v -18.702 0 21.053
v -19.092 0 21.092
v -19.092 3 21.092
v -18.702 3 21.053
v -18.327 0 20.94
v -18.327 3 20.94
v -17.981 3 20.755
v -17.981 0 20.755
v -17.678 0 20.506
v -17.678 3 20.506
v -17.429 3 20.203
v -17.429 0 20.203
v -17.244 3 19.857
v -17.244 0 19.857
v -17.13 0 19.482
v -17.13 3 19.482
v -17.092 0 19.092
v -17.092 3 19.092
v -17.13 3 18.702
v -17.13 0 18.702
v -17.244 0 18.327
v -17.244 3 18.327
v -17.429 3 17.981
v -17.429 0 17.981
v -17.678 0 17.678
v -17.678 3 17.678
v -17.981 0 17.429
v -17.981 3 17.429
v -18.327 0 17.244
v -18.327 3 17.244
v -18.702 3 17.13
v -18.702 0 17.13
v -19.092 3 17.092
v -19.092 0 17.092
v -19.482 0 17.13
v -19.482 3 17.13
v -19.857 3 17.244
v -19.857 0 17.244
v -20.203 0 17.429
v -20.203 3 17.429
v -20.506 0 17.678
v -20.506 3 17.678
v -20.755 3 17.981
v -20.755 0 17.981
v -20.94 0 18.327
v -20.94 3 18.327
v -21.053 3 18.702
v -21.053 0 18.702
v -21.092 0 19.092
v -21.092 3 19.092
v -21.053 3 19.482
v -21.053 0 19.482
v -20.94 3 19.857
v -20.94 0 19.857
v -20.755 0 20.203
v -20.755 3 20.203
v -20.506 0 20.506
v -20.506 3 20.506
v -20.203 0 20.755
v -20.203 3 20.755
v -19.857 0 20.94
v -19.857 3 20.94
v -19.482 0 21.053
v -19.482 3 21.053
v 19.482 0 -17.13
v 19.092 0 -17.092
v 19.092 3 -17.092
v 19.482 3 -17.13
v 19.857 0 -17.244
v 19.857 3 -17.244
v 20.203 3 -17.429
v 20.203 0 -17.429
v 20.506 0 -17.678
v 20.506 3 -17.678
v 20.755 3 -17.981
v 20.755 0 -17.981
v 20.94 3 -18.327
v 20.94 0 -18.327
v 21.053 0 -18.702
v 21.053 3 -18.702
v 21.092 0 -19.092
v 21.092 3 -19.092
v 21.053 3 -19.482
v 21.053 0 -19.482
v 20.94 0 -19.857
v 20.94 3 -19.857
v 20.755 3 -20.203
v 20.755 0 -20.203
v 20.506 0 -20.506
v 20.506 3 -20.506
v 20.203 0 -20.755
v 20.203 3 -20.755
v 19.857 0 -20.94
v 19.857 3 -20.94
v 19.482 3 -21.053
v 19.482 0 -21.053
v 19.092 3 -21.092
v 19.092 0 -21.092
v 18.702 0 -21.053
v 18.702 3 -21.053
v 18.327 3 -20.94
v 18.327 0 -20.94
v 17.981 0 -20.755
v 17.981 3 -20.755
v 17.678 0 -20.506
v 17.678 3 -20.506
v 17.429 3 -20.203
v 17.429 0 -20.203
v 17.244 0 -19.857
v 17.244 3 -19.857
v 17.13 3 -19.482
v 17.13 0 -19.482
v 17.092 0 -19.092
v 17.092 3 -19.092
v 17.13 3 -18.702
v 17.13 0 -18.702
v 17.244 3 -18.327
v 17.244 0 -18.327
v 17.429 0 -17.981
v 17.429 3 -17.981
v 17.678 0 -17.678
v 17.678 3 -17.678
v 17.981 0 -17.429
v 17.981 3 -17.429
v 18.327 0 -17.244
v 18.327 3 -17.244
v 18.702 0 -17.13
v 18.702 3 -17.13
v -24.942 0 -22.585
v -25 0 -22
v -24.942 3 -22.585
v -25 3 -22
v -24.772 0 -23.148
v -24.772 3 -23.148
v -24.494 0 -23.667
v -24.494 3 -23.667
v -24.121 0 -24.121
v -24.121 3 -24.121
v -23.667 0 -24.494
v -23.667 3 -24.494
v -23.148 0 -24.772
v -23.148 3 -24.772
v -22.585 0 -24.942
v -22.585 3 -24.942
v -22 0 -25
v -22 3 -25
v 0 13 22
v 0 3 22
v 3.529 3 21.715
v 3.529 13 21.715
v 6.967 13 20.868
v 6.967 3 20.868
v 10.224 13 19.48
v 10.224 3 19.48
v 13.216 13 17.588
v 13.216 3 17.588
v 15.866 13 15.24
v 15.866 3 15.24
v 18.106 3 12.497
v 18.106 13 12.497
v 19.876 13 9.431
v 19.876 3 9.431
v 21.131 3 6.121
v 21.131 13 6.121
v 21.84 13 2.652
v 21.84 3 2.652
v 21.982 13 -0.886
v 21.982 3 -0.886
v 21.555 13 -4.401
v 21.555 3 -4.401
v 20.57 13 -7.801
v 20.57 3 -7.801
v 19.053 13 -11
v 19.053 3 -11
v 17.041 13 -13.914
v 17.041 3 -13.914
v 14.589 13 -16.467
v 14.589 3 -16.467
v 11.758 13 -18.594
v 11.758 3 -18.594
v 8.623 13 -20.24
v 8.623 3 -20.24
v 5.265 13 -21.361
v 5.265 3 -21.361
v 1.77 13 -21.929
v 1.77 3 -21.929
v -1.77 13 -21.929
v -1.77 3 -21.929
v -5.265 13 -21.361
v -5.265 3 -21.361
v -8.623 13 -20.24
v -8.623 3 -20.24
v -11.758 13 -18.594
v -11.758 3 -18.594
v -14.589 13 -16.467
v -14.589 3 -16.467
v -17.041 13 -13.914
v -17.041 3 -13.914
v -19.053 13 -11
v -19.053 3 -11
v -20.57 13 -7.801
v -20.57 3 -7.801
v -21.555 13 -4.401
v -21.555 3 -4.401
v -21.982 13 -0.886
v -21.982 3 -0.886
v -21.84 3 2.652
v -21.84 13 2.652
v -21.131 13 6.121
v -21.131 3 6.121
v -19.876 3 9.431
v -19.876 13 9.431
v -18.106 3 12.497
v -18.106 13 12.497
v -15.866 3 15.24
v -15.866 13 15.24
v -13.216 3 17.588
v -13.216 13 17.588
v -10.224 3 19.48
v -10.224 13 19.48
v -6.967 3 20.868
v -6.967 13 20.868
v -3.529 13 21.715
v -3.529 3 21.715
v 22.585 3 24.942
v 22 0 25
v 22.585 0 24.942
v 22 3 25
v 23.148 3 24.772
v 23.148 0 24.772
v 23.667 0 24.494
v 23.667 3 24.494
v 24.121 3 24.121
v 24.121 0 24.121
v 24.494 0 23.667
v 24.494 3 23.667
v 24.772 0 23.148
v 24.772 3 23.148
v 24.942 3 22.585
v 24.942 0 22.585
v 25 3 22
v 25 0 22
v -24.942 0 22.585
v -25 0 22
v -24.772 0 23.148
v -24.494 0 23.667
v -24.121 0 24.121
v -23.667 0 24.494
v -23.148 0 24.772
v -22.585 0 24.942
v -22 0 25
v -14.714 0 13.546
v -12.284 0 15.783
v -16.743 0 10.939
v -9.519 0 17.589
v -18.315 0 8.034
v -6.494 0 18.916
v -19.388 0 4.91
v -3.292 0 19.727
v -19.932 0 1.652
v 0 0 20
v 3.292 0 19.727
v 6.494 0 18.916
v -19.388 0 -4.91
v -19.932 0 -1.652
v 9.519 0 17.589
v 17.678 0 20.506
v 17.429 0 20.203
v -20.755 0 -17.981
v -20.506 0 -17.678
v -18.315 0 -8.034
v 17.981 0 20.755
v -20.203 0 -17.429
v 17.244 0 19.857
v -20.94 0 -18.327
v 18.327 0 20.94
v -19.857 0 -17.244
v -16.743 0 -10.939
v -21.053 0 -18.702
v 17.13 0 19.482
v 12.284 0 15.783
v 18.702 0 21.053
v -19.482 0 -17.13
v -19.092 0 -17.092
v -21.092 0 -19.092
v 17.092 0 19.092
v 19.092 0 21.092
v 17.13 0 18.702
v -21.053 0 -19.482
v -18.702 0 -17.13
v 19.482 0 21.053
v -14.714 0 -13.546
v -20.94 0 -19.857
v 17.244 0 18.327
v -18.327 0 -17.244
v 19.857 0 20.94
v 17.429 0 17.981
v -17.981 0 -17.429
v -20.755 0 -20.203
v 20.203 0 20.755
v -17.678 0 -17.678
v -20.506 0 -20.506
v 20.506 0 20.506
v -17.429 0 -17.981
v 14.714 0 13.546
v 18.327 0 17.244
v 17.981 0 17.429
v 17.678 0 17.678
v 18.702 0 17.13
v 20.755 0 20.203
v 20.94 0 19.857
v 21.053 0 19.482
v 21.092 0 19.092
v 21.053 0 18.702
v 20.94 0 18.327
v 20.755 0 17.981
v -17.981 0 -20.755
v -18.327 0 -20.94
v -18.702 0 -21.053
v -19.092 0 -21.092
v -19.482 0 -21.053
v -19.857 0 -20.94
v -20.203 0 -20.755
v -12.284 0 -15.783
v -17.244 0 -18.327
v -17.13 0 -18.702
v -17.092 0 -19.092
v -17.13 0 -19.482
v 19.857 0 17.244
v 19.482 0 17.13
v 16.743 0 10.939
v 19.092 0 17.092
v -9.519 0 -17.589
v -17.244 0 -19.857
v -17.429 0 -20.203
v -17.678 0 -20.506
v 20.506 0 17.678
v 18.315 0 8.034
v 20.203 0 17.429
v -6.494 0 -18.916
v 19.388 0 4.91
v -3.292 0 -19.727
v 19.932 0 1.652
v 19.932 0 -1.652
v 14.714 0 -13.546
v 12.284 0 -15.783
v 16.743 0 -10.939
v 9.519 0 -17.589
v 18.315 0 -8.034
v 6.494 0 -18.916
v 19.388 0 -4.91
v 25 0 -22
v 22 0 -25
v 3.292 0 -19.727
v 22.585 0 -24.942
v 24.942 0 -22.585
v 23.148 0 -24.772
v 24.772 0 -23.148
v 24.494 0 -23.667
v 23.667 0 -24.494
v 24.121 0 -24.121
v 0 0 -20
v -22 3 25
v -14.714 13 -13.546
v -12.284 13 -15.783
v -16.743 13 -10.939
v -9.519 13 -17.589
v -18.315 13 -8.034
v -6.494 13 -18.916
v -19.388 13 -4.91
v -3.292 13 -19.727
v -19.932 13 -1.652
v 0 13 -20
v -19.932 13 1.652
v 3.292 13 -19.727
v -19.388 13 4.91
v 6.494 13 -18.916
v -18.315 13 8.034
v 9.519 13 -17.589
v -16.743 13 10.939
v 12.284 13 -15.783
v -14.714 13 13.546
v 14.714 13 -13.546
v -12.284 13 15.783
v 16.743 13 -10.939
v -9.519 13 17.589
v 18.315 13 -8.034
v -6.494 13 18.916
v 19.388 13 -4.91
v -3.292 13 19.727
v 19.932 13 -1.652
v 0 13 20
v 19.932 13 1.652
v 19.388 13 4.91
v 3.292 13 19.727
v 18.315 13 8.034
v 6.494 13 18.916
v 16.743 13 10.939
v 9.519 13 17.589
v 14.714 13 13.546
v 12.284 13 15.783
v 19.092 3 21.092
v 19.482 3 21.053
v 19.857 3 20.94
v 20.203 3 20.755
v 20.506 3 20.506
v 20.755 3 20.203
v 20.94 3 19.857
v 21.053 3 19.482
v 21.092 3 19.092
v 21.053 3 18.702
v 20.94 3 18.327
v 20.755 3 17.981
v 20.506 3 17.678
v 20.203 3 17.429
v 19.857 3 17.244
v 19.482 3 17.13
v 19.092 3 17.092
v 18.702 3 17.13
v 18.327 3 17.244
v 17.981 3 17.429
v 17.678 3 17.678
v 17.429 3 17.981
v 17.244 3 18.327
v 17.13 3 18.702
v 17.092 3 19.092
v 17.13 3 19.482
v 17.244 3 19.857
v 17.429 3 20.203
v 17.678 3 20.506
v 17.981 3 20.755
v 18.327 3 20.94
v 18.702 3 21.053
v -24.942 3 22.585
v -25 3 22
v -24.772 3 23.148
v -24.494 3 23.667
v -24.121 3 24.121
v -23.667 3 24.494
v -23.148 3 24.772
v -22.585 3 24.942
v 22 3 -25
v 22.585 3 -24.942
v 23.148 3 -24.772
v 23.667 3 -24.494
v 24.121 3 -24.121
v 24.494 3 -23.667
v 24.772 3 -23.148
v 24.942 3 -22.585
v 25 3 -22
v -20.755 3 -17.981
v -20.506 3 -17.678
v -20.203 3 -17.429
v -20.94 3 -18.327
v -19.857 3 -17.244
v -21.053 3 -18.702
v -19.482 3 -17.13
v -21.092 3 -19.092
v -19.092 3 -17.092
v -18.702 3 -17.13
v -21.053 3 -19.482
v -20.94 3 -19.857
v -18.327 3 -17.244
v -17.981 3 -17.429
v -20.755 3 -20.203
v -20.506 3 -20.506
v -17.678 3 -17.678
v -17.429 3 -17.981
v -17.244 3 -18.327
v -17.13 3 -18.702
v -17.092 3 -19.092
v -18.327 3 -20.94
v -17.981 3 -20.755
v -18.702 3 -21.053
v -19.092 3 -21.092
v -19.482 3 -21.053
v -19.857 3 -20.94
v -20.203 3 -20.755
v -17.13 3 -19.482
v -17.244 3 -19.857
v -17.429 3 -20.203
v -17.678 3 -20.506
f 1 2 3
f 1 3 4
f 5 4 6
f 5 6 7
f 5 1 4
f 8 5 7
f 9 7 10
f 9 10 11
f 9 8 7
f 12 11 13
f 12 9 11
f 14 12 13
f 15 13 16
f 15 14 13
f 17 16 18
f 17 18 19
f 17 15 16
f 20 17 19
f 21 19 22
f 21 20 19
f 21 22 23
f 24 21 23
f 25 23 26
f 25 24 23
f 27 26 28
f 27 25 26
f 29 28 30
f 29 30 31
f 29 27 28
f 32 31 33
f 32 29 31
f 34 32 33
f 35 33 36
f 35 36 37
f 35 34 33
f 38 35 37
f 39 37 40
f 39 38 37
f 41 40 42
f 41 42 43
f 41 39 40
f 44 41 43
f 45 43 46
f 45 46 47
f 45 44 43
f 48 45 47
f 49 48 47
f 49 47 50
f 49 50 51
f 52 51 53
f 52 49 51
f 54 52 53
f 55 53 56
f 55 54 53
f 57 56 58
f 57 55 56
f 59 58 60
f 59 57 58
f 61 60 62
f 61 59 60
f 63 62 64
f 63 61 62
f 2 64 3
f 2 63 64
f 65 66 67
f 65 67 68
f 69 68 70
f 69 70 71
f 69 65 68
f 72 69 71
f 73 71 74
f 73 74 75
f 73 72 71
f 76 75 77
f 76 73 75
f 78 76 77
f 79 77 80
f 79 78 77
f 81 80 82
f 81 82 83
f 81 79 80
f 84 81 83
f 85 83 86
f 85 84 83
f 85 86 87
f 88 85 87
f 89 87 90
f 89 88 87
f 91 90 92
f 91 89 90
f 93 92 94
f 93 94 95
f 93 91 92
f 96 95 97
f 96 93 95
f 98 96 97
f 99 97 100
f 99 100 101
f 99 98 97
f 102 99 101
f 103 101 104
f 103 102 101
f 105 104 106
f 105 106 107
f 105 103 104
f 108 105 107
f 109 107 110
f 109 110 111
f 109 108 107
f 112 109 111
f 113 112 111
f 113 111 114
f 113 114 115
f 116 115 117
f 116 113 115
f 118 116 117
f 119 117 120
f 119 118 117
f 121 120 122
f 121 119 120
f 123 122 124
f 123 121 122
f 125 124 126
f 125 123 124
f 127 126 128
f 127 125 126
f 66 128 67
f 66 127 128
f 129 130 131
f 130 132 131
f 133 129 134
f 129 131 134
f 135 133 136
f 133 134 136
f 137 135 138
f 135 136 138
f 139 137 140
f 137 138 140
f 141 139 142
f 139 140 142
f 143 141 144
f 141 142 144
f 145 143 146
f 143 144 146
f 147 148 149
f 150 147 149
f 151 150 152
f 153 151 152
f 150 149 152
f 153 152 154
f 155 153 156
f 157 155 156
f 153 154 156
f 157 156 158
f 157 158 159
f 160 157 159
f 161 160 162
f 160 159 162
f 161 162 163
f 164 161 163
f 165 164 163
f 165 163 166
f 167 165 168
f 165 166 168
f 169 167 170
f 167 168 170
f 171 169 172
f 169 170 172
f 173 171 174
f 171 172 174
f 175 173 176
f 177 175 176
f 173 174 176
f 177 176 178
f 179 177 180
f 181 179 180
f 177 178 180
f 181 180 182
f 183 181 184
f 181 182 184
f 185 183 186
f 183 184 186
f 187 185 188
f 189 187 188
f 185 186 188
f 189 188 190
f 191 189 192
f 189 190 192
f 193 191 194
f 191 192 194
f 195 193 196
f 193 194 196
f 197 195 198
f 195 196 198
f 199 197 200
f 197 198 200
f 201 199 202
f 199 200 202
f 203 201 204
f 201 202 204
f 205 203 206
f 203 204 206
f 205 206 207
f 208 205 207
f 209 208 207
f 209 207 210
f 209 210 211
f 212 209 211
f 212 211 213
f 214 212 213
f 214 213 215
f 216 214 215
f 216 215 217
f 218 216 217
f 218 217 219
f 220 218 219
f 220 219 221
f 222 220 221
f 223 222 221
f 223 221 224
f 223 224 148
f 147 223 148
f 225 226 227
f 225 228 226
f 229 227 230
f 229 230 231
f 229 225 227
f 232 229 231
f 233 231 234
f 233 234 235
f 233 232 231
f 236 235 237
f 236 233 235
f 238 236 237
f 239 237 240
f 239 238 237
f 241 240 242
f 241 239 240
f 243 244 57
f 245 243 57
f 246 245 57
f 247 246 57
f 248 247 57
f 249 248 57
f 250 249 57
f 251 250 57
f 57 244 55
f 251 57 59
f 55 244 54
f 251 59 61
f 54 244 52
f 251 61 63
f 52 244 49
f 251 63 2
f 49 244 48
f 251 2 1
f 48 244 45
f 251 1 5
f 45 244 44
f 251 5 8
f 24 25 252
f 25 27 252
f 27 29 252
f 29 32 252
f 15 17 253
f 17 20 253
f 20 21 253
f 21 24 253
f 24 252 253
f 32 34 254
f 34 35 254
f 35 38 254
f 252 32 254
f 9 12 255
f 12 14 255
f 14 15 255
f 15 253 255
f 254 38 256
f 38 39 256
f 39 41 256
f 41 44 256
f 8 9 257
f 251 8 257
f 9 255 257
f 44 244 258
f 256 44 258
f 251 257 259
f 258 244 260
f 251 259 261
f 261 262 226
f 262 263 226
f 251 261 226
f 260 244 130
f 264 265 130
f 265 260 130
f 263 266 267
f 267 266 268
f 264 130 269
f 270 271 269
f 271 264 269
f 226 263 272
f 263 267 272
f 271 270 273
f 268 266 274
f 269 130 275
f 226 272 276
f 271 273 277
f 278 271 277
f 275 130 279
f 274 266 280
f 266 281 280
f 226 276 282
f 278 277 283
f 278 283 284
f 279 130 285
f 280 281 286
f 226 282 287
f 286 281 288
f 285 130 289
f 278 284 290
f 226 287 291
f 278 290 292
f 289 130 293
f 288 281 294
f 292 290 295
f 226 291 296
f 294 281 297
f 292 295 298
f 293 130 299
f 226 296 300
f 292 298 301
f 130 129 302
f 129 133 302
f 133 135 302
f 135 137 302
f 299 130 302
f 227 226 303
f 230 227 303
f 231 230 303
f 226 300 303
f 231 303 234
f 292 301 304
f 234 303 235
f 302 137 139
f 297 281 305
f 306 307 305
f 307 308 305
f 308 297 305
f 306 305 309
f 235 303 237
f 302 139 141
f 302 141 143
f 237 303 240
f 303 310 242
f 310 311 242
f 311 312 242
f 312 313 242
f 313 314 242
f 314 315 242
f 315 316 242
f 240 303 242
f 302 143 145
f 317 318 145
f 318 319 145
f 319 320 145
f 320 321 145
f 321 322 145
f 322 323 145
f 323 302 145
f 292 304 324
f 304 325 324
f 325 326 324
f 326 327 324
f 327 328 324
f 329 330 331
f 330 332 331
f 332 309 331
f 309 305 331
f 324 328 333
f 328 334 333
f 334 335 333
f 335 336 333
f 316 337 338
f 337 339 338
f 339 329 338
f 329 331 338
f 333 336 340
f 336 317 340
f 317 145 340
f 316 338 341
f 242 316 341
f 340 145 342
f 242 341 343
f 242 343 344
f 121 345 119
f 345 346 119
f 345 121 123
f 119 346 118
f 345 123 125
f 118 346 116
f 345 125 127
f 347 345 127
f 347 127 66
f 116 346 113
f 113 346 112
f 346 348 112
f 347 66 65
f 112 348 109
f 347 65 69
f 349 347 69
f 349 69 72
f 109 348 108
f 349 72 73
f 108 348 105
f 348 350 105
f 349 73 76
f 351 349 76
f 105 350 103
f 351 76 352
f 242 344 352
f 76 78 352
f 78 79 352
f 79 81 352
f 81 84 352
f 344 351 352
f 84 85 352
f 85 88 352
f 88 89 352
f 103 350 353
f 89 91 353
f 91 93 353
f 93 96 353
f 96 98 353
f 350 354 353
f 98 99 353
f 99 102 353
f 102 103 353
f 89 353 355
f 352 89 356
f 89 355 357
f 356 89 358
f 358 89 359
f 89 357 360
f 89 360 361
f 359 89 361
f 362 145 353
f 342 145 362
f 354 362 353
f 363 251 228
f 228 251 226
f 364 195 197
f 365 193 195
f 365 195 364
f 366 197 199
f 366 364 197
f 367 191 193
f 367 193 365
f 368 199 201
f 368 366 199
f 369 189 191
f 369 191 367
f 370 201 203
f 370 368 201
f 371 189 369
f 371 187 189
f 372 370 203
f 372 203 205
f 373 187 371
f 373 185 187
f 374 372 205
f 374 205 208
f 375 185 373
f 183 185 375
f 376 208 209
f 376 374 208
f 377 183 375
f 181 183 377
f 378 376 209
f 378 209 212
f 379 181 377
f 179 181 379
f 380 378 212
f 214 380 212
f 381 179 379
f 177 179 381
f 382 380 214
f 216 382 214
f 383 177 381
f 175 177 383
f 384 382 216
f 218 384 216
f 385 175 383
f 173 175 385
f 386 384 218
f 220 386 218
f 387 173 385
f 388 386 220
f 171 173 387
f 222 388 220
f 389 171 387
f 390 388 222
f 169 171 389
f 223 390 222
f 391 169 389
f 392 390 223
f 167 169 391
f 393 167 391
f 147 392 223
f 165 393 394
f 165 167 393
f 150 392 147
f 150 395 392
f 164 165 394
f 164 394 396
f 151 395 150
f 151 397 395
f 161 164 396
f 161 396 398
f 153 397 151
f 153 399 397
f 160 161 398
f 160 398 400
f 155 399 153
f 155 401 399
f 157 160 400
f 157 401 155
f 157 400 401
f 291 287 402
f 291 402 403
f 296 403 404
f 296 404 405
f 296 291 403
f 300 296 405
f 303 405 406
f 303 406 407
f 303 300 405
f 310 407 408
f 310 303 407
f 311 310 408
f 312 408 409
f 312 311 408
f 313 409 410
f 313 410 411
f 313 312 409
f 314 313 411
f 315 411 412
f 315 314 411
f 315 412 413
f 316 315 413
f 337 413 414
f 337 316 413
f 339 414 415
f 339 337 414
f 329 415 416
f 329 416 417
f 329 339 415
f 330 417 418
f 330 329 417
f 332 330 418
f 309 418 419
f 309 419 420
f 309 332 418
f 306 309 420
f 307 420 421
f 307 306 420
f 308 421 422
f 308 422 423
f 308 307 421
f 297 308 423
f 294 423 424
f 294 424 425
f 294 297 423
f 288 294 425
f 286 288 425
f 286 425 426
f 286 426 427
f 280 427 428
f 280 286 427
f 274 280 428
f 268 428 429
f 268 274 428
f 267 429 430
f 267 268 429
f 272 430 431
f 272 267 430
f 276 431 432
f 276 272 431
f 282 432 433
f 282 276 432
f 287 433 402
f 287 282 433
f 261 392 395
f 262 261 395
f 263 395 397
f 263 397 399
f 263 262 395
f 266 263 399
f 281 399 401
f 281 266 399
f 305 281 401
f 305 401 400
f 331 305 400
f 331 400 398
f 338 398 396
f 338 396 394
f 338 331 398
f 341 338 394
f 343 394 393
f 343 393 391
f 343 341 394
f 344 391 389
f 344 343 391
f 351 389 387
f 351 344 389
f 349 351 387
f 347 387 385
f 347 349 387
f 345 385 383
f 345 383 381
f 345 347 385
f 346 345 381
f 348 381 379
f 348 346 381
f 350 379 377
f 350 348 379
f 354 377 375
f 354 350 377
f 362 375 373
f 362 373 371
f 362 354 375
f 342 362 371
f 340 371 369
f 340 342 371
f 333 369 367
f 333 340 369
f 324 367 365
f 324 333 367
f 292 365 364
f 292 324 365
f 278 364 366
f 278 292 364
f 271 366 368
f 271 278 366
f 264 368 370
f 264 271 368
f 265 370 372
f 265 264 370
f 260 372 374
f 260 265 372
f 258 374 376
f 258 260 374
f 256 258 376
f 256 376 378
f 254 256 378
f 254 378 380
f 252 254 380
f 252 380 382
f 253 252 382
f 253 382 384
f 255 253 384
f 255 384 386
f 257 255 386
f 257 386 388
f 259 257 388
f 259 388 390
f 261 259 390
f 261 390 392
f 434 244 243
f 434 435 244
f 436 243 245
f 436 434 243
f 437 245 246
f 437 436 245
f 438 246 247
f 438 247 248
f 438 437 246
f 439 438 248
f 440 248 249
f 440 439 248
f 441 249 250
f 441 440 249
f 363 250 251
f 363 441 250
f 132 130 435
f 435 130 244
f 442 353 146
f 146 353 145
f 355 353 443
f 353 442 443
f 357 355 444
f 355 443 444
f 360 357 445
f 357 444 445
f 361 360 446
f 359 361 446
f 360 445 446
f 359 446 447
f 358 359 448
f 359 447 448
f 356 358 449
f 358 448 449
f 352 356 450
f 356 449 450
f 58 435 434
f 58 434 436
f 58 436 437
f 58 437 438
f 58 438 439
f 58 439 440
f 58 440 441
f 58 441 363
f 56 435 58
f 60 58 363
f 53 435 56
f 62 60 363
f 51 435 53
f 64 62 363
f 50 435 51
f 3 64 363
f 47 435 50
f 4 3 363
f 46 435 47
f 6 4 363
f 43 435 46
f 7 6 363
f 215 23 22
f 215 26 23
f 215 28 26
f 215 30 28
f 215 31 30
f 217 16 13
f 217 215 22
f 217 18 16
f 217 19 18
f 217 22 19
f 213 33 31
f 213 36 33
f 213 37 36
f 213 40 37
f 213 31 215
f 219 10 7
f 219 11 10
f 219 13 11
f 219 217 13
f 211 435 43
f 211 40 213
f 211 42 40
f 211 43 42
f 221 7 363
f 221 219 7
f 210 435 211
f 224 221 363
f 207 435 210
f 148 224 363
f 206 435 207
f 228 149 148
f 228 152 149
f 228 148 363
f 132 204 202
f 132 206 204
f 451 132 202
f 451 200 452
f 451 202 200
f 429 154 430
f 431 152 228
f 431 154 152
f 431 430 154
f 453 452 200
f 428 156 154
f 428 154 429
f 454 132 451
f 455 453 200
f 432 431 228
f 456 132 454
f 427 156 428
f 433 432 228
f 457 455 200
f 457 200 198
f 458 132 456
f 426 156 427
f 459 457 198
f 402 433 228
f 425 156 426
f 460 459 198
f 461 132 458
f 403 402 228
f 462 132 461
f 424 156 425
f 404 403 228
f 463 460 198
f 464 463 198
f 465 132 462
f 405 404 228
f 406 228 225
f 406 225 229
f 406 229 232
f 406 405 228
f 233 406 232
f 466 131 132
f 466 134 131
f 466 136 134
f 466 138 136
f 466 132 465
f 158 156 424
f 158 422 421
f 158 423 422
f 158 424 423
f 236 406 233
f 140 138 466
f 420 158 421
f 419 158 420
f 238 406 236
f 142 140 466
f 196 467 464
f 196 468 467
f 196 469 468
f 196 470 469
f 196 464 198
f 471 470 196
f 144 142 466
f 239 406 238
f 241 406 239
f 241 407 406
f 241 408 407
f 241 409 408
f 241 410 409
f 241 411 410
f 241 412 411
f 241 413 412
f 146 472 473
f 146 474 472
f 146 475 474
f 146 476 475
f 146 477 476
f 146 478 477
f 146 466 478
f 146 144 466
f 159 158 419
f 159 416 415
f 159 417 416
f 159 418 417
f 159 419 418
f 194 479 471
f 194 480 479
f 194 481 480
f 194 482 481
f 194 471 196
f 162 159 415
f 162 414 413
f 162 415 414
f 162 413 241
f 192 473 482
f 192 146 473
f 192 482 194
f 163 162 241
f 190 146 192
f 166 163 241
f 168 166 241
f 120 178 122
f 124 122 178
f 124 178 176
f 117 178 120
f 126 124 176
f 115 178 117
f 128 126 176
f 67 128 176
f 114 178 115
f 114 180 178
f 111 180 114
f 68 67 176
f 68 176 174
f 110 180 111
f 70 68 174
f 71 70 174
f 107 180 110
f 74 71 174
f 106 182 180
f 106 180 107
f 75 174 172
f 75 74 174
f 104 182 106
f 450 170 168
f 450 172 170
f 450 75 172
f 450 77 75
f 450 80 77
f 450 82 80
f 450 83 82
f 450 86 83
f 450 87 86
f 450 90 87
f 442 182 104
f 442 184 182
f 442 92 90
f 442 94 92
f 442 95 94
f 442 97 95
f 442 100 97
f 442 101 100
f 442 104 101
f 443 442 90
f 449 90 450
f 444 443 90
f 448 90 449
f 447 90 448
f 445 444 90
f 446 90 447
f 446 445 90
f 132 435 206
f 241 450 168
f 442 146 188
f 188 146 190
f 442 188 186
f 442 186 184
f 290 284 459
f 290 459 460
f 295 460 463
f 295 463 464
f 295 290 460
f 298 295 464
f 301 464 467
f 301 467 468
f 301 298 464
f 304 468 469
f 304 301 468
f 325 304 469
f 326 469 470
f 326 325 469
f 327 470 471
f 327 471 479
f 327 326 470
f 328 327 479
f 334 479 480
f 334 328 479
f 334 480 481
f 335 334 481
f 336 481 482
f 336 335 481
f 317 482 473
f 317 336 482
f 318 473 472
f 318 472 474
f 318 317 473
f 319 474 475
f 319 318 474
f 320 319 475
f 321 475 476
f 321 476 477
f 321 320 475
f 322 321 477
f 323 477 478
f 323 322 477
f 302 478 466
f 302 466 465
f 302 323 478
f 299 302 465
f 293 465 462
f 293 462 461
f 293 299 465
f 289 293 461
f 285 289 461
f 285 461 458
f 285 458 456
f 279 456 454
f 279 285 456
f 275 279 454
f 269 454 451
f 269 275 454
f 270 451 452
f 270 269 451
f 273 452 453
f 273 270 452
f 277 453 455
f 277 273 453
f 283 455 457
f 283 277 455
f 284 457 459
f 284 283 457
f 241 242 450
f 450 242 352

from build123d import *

# Parameters (mm, degrees)
SKETCH1_R           = 2
SKETCH1_R_2         = 20
BOSS_EXTRUDE1_DEPTH = 3
FILLET2_R           = 3
SKETCH2_R           = 22
SKETCH2_R_2         = 20
BOSS_EXTRUDE3_DEPTH = 10


with BuildPart() as part:
    # Sketch1 → Boss-Extrude1 (new body)
    with BuildSketch(Plane(origin=(0, 0, 0), x_dir=(1, 0, 0), z_dir=(0, 1, 0))):
        Polygon((0, 25), (-25, 25), (-25, -25), (25, -25), (25, 25), align=None)
        with Locations(Location((-19.091883092, 19.091883092, 0), (0, 0, 270))):
            Circle(SKETCH1_R, mode=Mode.SUBTRACT)
        with Locations(Location((19.091883092, 19.091883092, 0), (0, 0, 270))):
            Circle(SKETCH1_R, mode=Mode.SUBTRACT)
        with Locations(Location((19.091883092, -19.091883092, 0), (0, 0, 270))):
            Circle(SKETCH1_R, mode=Mode.SUBTRACT)
        with Locations(Location((-19.091883092, -19.091883092, 0), (0, 0, 270))):
            Circle(SKETCH1_R, mode=Mode.SUBTRACT)
        with Locations(Location((0, 0, 0), (0, 0, 270))):
            Circle(SKETCH1_R_2, mode=Mode.SUBTRACT)
    extrude(amount=BOSS_EXTRUDE1_DEPTH)

    # Fillet2
    fillet2_edges = [part.edges().sort_by_distance(p)[0] for p in [
        (25, 1.5, -25),
        (25, 1.5, 25),
        (-25, 1.5, 25),
        (-25, 1.5, -25),
    ]]
    fillet(fillet2_edges, radius=FILLET2_R)

    # Sketch2 → Boss-Extrude3 (add)
    with BuildSketch(Plane(origin=(0, 3, 0), x_dir=(1, 0, 0), z_dir=(0, 1, 0))):
        with Locations(Location((0, 0, 0), (0, 0, 270))):
            Circle(SKETCH2_R)
        with Locations(Location((0, 0, 0), (0, 0, 270))):
            Circle(SKETCH2_R_2, mode=Mode.SUBTRACT)
    extrude(amount=BOSS_EXTRUDE3_DEPTH)


solid = part.part
